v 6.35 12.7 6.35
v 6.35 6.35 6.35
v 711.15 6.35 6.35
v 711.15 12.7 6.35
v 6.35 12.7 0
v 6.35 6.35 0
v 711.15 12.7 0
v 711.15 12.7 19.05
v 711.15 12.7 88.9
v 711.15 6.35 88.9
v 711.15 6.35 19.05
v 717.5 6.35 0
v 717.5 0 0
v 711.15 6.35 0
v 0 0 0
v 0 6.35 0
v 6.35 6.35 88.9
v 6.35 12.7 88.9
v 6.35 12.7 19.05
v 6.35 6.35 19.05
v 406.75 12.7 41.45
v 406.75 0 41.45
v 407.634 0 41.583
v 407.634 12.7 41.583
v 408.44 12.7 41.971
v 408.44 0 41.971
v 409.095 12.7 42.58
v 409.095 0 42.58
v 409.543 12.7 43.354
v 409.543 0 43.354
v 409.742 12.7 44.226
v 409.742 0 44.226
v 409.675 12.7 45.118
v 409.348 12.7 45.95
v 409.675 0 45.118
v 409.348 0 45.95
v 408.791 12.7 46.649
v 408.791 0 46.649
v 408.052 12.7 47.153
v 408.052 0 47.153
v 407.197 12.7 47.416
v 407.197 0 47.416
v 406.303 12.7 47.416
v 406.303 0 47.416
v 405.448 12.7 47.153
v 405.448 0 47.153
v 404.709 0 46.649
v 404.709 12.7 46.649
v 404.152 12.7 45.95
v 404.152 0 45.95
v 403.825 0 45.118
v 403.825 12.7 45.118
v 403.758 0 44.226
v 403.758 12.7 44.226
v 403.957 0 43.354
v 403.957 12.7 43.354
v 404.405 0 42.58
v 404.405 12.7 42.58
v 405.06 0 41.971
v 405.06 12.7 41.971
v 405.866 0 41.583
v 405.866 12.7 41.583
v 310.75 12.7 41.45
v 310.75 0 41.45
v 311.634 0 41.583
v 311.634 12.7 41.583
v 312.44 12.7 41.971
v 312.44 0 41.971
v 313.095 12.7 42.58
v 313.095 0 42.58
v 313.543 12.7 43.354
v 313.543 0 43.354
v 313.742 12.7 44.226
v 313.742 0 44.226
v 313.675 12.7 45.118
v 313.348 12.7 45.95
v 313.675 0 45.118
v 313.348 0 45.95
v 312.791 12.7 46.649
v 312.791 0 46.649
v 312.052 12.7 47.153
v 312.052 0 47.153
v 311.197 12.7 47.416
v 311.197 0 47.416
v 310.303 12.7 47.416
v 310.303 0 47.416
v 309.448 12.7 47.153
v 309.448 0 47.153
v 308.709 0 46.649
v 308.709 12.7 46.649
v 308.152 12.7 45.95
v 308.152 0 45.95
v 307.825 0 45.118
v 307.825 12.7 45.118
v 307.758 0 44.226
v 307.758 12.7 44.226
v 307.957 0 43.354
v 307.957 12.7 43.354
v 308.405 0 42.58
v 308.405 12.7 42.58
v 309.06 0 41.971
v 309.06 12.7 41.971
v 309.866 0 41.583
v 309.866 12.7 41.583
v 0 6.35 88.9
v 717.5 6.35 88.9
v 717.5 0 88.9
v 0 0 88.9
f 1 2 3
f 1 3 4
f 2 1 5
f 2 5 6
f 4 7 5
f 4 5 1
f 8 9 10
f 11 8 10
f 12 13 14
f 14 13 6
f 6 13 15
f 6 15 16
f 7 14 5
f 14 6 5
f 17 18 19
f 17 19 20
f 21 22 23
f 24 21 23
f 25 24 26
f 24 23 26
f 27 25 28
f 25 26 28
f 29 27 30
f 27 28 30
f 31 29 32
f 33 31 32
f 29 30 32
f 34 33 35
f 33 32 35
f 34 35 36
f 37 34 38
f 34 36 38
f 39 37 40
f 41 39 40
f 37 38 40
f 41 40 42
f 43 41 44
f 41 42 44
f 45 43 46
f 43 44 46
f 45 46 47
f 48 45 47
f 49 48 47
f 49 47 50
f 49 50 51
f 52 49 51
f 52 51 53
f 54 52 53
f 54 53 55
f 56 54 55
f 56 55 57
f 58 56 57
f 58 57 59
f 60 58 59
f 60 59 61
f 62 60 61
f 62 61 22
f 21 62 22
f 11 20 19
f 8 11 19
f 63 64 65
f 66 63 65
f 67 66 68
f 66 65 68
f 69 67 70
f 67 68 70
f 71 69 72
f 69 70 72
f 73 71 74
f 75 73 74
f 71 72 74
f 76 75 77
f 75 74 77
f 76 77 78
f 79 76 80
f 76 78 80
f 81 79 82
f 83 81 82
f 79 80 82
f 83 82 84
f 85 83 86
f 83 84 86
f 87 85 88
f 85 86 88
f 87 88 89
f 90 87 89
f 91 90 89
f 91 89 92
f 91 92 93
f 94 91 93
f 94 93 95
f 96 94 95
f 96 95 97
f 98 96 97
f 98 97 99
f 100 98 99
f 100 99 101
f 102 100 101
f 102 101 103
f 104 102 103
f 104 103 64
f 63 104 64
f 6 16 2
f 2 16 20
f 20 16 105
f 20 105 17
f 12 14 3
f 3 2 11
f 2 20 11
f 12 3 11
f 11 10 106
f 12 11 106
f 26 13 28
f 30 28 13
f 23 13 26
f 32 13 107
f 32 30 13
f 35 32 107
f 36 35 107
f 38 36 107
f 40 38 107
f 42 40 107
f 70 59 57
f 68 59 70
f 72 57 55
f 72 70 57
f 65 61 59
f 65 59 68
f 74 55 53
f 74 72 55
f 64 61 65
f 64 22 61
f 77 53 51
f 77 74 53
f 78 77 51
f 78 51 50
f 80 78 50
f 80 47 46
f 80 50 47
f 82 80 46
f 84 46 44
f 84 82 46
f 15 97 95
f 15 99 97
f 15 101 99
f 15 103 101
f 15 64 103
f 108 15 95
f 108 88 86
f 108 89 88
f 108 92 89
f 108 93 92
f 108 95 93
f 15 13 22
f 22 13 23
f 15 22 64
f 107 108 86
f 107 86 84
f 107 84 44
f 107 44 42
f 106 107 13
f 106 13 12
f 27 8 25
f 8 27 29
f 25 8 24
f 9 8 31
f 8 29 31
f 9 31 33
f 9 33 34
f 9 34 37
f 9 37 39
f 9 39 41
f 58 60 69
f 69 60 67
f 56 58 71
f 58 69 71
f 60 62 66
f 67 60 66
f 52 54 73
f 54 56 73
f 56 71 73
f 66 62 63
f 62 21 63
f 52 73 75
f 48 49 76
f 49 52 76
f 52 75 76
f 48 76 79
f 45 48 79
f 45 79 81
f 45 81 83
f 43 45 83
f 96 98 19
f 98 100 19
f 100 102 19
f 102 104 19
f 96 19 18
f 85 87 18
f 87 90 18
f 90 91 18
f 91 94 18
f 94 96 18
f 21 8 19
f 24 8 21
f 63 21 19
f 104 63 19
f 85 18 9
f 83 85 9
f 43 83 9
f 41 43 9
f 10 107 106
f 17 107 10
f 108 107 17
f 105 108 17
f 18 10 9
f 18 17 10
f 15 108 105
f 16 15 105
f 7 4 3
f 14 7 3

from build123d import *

# Parameters (mm, degrees)
SKETCH_W        = 12.7
SKETCH_H        = 88.9
PAD_DEPTH       = 717.5
SKETCH001_W     = 6.35
SKETCH001_H     = 12.7
POCKET_DEPTH    = 717.501
SKETCH002_W     = 6.35
SKETCH002_H     = 6.35
POCKET001_DEPTH = 88.901
SKETCH003_R     = 3
HOLE_DEPTH      = 12.701


with BuildPart() as part:
    # Sketch → Pad (new body)
    with BuildSketch(Plane.YZ):
        with Locations((6.35, 44.45)):
            Rectangle(SKETCH_W, SKETCH_H)
    extrude(amount=PAD_DEPTH)

    # Sketch001 (on Face6 of Pad) → Pocket (cut, through all)
    with BuildSketch(Plane.YZ.offset(717.5)):
        with Locations((9.525, 12.7)):
            Rectangle(SKETCH001_W, SKETCH001_H)
    extrude(amount=-POCKET_DEPTH, mode=Mode.SUBTRACT)

    # Sketch002 (on Face6 of Pocket) → Pocket001 (cut, through all)
    with BuildSketch(Plane(origin=(0, 0, 88.9), x_dir=(0, -1, 0), z_dir=(0, 0, 1))):
        with Locations((-9.525, 714.325)):
            Rectangle(SKETCH002_W, SKETCH002_H)
        with Locations((-9.525, 3.175)):
            Rectangle(SKETCH002_W, SKETCH002_H)
    extrude(amount=-POCKET001_DEPTH, mode=Mode.SUBTRACT)

    # Sketch003 (on Face9 of Pocket001) → Hole (cut, through all)
    with BuildSketch(Plane(origin=(0, 0, 0), x_dir=(0, 0, -1), z_dir=(0, -1, 0))):
        with Locations((-44.45, 310.75)):
            Circle(SKETCH003_R)
        with Locations((-44.45, 406.75)):
            Circle(SKETCH003_R)
    extrude(amount=-HOLE_DEPTH, mode=Mode.SUBTRACT)


solid = part.part
